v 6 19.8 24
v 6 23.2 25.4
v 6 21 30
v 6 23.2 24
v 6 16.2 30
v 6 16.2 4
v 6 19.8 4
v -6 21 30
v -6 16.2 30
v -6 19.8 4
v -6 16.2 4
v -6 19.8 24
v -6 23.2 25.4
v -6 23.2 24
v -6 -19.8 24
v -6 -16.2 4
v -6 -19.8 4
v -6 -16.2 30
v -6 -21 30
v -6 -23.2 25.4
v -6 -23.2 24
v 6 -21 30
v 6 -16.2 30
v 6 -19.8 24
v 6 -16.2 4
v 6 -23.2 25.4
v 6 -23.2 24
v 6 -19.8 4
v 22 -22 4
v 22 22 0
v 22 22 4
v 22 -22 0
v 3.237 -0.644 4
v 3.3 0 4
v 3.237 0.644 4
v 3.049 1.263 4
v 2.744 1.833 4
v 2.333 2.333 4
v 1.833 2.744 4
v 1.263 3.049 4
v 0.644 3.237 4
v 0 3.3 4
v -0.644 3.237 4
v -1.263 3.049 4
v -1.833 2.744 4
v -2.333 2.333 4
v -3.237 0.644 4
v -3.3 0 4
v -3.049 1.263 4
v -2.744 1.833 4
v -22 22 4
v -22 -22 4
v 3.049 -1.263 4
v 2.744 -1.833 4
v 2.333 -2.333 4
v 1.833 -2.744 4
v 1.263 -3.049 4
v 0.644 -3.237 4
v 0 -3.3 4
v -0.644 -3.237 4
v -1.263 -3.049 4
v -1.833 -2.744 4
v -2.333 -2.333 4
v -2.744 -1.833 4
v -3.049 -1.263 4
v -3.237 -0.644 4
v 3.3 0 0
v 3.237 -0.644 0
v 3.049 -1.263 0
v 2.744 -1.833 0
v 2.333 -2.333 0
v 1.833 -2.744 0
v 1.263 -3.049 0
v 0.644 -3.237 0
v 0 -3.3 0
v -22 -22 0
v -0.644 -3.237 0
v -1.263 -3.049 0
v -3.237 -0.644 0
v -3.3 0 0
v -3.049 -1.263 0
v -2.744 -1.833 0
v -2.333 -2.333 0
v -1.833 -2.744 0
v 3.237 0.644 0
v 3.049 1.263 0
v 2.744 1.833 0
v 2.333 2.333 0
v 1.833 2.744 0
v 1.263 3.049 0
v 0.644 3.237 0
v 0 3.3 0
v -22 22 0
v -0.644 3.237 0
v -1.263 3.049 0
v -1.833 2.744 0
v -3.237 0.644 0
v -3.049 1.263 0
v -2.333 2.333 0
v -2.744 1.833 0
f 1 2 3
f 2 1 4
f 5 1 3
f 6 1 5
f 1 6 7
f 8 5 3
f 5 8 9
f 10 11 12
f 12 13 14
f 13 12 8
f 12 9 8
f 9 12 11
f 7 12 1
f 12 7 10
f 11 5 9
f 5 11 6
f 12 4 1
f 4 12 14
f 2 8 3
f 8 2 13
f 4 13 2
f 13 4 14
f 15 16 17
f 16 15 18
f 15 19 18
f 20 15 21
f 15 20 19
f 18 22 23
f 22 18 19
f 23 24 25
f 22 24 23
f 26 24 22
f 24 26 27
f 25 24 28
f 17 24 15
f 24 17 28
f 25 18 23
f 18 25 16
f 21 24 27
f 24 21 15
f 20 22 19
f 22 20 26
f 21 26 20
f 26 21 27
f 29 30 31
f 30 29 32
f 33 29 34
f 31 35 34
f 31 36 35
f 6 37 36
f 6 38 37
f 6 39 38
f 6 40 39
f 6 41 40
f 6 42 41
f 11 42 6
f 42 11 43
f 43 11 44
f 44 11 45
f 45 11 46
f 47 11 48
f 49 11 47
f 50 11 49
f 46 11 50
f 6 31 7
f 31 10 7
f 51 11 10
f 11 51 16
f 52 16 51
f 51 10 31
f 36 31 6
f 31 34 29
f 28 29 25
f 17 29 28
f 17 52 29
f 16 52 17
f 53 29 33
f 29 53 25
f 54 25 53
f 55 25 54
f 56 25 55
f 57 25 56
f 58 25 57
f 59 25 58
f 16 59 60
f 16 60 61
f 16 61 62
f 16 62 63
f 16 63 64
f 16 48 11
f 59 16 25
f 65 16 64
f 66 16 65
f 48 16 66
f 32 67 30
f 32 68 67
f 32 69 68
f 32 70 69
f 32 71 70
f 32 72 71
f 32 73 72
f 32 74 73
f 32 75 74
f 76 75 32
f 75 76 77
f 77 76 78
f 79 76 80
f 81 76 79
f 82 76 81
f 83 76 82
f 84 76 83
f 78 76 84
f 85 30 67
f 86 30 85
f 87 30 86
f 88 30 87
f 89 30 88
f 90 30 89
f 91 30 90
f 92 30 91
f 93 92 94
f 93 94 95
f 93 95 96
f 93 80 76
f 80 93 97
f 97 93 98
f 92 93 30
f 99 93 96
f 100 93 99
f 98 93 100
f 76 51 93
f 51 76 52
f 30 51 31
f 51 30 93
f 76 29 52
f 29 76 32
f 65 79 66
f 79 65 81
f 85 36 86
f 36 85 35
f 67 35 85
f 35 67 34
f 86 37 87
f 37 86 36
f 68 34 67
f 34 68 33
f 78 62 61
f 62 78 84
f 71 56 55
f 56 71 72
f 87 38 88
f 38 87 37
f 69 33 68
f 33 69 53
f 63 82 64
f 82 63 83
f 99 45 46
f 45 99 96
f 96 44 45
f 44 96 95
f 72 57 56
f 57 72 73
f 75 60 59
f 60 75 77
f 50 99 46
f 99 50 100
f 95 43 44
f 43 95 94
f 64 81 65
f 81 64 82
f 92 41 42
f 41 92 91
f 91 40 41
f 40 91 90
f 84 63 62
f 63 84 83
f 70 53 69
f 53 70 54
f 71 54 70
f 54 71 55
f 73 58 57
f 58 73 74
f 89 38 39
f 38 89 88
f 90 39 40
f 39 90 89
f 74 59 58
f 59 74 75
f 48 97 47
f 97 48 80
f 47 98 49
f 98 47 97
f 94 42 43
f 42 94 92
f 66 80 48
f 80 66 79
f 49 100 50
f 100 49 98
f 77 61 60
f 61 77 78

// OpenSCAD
$fn = 32;

// ----------------------------------------------------------------------
// Snap-fit latch: 2 arms, 26 mm tall, 3.6 mm undercut hooks
// ----------------------------------------------------------------------

// --- parameters (mm) ---
base_d = 44;              // base plate depth
base_h = 4;               // base plate thickness
span = 36;                // distance between opposite arms
arm_t = 3.6;              // arm thickness
arm_d = 12;               // arm width
height = 26;              // free arm length
head_len = 3.6;           // hook reach
head_h = 6;               // hook height
lead = 1.4;               // lead-in ramp thickness
bore_d = 6.6;             // base fixing bore
top_z = 30;               // height of the arm tips above the base

arms = 2;

difference() {
  union() {
    /* base plate, centred on the arm ring */
    translate([-22, -22, 0]) cube([base_d, base_d, base_h]);
    for (a = [0 : 360 / arms : 359]) rotate([0, 0, a]) {
    /* arm, sunk 0.5 mm into the base */
    translate([-arm_d / 2, span / 2 - arm_t / 2, base_h - 0.5]) cube([arm_d, arm_t, height + 0.5]);
    /* hook: a convex hull of a tall inner block and a thin outer lip
       gives a flat undercut below and a lead-in ramp on top */
    hull() {
      translate([-arm_d / 2, span / 2 + arm_t / 2 - 0.6, top_z - head_h]) cube([arm_d, lead + 0.4, head_h]);
      translate([-arm_d / 2, span / 2 + arm_t / 2 - 0.2, top_z - head_h]) cube([arm_d, head_len, lead]);
    }
    }
  }
  translate([0, 0, -2.5]) cylinder(h = base_h + 5, d = bore_d);
}
